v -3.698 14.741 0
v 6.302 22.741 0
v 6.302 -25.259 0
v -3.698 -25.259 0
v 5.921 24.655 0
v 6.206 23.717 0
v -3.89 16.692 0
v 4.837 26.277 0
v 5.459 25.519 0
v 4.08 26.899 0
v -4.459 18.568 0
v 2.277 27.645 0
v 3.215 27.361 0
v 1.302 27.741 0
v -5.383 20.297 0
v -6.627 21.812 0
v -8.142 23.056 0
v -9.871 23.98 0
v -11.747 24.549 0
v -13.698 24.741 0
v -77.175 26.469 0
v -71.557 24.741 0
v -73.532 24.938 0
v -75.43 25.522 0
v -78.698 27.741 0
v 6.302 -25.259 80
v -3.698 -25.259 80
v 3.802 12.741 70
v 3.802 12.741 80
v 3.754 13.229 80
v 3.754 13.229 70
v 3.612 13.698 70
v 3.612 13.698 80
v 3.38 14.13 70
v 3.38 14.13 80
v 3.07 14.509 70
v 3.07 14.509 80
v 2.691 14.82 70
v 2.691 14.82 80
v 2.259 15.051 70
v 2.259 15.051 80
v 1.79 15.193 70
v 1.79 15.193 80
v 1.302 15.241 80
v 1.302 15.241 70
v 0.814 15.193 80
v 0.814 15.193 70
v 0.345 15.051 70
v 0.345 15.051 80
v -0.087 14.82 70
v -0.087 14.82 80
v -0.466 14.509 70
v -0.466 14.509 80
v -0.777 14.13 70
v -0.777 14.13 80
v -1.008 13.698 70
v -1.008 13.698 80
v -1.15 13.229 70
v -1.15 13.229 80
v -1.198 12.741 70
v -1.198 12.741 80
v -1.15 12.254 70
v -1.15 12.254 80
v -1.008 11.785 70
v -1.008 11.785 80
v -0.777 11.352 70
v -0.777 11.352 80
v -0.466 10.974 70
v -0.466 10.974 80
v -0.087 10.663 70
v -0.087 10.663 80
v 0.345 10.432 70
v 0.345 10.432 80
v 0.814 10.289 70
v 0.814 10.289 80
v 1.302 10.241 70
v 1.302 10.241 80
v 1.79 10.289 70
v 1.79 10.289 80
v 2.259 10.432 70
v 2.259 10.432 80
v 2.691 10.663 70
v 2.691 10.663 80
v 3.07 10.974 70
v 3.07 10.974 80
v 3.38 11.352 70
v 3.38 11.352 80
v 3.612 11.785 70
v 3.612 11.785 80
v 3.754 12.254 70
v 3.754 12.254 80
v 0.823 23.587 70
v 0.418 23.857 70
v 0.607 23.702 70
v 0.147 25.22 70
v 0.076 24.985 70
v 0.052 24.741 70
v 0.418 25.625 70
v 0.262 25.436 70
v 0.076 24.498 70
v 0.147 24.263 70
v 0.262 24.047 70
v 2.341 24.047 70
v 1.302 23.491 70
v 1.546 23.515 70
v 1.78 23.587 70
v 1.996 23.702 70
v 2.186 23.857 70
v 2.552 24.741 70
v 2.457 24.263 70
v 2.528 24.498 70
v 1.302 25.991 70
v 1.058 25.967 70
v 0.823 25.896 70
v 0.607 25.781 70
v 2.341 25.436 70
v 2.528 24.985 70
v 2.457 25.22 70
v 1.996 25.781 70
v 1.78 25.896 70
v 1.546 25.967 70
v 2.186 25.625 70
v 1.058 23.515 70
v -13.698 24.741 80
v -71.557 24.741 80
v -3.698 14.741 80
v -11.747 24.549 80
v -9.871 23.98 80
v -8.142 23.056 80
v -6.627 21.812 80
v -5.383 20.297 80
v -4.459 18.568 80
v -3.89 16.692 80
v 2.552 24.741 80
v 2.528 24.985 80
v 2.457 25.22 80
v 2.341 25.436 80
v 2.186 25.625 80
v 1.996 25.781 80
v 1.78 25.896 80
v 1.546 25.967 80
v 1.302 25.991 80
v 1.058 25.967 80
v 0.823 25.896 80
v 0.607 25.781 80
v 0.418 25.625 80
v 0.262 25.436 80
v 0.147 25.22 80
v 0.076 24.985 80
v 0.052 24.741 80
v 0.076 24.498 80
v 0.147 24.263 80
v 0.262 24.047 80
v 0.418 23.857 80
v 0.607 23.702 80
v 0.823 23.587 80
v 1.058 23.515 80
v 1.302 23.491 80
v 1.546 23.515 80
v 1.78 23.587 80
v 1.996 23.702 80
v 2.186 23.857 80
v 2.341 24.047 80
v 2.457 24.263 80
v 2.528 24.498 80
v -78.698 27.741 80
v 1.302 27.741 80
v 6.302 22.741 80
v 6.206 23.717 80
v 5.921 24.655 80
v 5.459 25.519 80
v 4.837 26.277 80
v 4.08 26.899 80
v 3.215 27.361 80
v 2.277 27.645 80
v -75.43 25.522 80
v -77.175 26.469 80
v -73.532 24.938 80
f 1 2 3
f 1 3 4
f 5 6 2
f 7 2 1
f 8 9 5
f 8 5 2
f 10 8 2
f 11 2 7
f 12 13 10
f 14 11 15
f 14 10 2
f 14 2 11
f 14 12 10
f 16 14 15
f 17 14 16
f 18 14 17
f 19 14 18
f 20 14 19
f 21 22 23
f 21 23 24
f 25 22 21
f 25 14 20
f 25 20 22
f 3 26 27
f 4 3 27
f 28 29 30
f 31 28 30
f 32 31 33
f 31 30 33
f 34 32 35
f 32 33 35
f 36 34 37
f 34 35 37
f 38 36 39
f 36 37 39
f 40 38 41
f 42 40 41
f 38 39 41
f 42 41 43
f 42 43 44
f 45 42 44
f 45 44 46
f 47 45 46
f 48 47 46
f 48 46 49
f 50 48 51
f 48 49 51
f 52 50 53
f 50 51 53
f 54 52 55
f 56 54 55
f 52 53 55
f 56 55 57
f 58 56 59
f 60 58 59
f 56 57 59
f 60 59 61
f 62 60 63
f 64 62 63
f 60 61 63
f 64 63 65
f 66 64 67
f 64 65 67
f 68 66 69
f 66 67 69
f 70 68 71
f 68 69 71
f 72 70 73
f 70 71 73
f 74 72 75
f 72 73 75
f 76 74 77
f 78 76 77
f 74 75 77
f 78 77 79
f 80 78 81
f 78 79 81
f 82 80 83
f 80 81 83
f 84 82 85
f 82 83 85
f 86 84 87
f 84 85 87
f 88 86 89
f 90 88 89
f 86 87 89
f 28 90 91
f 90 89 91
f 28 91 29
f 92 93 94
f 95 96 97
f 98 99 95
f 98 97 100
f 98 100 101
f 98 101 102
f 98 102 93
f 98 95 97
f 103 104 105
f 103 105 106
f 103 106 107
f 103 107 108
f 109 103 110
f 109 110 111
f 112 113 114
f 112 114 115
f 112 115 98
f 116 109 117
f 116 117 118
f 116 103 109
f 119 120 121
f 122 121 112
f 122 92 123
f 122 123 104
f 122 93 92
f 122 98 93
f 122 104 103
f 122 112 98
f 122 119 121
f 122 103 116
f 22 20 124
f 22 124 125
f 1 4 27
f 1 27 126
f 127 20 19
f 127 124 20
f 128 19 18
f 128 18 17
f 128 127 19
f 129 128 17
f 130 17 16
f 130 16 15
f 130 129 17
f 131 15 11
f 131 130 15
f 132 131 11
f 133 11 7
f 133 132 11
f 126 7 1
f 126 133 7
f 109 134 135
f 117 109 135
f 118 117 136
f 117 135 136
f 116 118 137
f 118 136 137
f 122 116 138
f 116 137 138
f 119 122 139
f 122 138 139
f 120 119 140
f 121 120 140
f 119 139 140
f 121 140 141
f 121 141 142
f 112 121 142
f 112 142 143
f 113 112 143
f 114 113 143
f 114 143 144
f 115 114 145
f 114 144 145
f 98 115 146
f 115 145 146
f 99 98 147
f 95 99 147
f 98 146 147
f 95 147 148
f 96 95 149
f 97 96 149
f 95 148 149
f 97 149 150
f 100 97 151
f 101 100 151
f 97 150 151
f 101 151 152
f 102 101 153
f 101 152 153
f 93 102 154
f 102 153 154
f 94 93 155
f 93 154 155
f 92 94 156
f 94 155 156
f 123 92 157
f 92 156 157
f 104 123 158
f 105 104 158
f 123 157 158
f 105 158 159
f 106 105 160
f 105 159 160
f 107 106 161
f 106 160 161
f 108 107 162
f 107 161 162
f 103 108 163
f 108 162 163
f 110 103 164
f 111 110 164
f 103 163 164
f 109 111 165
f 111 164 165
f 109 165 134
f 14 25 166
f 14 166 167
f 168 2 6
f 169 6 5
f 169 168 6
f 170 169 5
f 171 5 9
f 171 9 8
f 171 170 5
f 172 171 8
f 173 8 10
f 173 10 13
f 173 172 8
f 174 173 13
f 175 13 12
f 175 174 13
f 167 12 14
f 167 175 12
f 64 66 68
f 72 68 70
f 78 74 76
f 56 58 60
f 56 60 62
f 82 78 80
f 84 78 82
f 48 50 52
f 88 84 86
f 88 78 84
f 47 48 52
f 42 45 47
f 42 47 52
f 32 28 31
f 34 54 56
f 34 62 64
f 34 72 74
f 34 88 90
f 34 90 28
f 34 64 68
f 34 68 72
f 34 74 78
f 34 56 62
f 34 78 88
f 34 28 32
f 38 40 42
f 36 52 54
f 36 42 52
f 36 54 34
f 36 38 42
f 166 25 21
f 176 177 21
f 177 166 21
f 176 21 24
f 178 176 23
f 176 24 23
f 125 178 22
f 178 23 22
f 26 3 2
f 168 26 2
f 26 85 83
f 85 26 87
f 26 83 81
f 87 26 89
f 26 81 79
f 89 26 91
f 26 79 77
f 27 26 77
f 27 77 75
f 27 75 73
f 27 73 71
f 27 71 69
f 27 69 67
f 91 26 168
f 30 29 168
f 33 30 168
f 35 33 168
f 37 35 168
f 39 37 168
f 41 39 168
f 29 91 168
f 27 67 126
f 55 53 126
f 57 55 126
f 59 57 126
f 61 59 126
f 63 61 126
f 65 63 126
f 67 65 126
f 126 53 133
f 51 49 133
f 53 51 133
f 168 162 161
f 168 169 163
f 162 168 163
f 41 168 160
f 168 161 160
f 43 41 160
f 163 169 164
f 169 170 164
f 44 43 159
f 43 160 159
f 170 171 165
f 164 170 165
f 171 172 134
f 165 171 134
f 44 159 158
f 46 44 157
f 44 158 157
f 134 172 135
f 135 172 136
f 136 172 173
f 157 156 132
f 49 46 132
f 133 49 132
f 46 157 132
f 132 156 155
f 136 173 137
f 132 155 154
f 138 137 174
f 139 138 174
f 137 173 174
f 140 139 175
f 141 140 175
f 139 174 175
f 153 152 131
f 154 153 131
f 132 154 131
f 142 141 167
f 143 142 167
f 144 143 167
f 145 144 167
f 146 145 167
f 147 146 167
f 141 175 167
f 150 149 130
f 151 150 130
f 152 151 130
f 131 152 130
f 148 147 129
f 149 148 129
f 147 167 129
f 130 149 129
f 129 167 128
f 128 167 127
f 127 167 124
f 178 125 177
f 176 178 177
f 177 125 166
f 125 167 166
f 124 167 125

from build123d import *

# Parameters (mm, degrees)
RESSALTO_EXTRUS_O1_DEPTH = 80
ESBO_O3_R                = 2.5
CORTE_EXTRUS_O2_DEPTH    = 10
ESBO_O4_R                = 1.25
CORTE_EXTRUS_O3_DEPTH    = 10
FILETE1_R                = 10
FILETE2_R                = 5
FILETE3_R                = 10


with BuildPart() as part:
    # Esboço1 → Ressalto-extrusão1 (new body)
    with BuildSketch(Plane.XY):
        Polygon((-78.698181647, 27.74137931), (6.301818353, 27.74137931), (6.301818353, 24.74137931), (6.301818353, -25.25862069), (-3.698181647, -25.25862069), (-3.698181647, 24.74137931), (-78.698181647, 24.74137931), align=None)
    extrude(amount=RESSALTO_EXTRUS_O1_DEPTH)

    # Esboço3 → Corte-extrusão2 (cut)
    with BuildSketch(Plane.XY.offset(80)):
        with Locations((1.301818353, 12.74137931)):
            Circle(ESBO_O3_R)
    extrude(amount=-CORTE_EXTRUS_O2_DEPTH, mode=Mode.SUBTRACT)

    # Esboço4 → Corte-extrusão3 (cut)
    with BuildSketch(Plane.XY.offset(80)):
        with Locations((1.301818353, 24.74137931)):
            Circle(ESBO_O4_R)
    extrude(amount=-CORTE_EXTRUS_O3_DEPTH, mode=Mode.SUBTRACT)

    # Filete1
    filete1_edges = [part.edges().sort_by_distance(p)[0] for p in [
        (-3.698181647, 24.74137931, 40),
    ]]
    fillet(filete1_edges, radius=FILETE1_R)

    # Filete2
    filete2_edges = [part.edges().sort_by_distance(p)[0] for p in [
        (6.301818353, 27.74137931, 40),
    ]]
    fillet(filete2_edges, radius=FILETE2_R)

    # Filete3
    # the kernel refuses this fillet: 10 mm, written as the material it takes off along each edge
    with BuildSketch(Plane(origin=(-78.698181647, 24.74137931, -17.853571071), x_dir=(0, 1, 0), z_dir=(0, 0, 1))) as filete3_piece_1:
        with BuildLine():
            CenterArc((10, -7.141428429), FILETE3_R, 134.427004001, 45.572995999)
            Line((0, -7.141428429), (-0.2, -7.141428429))
            Line((-0.2, -7.141428429), (-0.2, 0))
            Line((-0.2, 0), (0, 0.2))
            ThreePointArc((0, 0.2), (1.5, 0.2), (2.86, 0.142828569))
            Line((2.86, 0.142828569), (3, 0))
        make_face()
    extrude(amount=115.707142143, mode=Mode.SUBTRACT)


solid = part.part
